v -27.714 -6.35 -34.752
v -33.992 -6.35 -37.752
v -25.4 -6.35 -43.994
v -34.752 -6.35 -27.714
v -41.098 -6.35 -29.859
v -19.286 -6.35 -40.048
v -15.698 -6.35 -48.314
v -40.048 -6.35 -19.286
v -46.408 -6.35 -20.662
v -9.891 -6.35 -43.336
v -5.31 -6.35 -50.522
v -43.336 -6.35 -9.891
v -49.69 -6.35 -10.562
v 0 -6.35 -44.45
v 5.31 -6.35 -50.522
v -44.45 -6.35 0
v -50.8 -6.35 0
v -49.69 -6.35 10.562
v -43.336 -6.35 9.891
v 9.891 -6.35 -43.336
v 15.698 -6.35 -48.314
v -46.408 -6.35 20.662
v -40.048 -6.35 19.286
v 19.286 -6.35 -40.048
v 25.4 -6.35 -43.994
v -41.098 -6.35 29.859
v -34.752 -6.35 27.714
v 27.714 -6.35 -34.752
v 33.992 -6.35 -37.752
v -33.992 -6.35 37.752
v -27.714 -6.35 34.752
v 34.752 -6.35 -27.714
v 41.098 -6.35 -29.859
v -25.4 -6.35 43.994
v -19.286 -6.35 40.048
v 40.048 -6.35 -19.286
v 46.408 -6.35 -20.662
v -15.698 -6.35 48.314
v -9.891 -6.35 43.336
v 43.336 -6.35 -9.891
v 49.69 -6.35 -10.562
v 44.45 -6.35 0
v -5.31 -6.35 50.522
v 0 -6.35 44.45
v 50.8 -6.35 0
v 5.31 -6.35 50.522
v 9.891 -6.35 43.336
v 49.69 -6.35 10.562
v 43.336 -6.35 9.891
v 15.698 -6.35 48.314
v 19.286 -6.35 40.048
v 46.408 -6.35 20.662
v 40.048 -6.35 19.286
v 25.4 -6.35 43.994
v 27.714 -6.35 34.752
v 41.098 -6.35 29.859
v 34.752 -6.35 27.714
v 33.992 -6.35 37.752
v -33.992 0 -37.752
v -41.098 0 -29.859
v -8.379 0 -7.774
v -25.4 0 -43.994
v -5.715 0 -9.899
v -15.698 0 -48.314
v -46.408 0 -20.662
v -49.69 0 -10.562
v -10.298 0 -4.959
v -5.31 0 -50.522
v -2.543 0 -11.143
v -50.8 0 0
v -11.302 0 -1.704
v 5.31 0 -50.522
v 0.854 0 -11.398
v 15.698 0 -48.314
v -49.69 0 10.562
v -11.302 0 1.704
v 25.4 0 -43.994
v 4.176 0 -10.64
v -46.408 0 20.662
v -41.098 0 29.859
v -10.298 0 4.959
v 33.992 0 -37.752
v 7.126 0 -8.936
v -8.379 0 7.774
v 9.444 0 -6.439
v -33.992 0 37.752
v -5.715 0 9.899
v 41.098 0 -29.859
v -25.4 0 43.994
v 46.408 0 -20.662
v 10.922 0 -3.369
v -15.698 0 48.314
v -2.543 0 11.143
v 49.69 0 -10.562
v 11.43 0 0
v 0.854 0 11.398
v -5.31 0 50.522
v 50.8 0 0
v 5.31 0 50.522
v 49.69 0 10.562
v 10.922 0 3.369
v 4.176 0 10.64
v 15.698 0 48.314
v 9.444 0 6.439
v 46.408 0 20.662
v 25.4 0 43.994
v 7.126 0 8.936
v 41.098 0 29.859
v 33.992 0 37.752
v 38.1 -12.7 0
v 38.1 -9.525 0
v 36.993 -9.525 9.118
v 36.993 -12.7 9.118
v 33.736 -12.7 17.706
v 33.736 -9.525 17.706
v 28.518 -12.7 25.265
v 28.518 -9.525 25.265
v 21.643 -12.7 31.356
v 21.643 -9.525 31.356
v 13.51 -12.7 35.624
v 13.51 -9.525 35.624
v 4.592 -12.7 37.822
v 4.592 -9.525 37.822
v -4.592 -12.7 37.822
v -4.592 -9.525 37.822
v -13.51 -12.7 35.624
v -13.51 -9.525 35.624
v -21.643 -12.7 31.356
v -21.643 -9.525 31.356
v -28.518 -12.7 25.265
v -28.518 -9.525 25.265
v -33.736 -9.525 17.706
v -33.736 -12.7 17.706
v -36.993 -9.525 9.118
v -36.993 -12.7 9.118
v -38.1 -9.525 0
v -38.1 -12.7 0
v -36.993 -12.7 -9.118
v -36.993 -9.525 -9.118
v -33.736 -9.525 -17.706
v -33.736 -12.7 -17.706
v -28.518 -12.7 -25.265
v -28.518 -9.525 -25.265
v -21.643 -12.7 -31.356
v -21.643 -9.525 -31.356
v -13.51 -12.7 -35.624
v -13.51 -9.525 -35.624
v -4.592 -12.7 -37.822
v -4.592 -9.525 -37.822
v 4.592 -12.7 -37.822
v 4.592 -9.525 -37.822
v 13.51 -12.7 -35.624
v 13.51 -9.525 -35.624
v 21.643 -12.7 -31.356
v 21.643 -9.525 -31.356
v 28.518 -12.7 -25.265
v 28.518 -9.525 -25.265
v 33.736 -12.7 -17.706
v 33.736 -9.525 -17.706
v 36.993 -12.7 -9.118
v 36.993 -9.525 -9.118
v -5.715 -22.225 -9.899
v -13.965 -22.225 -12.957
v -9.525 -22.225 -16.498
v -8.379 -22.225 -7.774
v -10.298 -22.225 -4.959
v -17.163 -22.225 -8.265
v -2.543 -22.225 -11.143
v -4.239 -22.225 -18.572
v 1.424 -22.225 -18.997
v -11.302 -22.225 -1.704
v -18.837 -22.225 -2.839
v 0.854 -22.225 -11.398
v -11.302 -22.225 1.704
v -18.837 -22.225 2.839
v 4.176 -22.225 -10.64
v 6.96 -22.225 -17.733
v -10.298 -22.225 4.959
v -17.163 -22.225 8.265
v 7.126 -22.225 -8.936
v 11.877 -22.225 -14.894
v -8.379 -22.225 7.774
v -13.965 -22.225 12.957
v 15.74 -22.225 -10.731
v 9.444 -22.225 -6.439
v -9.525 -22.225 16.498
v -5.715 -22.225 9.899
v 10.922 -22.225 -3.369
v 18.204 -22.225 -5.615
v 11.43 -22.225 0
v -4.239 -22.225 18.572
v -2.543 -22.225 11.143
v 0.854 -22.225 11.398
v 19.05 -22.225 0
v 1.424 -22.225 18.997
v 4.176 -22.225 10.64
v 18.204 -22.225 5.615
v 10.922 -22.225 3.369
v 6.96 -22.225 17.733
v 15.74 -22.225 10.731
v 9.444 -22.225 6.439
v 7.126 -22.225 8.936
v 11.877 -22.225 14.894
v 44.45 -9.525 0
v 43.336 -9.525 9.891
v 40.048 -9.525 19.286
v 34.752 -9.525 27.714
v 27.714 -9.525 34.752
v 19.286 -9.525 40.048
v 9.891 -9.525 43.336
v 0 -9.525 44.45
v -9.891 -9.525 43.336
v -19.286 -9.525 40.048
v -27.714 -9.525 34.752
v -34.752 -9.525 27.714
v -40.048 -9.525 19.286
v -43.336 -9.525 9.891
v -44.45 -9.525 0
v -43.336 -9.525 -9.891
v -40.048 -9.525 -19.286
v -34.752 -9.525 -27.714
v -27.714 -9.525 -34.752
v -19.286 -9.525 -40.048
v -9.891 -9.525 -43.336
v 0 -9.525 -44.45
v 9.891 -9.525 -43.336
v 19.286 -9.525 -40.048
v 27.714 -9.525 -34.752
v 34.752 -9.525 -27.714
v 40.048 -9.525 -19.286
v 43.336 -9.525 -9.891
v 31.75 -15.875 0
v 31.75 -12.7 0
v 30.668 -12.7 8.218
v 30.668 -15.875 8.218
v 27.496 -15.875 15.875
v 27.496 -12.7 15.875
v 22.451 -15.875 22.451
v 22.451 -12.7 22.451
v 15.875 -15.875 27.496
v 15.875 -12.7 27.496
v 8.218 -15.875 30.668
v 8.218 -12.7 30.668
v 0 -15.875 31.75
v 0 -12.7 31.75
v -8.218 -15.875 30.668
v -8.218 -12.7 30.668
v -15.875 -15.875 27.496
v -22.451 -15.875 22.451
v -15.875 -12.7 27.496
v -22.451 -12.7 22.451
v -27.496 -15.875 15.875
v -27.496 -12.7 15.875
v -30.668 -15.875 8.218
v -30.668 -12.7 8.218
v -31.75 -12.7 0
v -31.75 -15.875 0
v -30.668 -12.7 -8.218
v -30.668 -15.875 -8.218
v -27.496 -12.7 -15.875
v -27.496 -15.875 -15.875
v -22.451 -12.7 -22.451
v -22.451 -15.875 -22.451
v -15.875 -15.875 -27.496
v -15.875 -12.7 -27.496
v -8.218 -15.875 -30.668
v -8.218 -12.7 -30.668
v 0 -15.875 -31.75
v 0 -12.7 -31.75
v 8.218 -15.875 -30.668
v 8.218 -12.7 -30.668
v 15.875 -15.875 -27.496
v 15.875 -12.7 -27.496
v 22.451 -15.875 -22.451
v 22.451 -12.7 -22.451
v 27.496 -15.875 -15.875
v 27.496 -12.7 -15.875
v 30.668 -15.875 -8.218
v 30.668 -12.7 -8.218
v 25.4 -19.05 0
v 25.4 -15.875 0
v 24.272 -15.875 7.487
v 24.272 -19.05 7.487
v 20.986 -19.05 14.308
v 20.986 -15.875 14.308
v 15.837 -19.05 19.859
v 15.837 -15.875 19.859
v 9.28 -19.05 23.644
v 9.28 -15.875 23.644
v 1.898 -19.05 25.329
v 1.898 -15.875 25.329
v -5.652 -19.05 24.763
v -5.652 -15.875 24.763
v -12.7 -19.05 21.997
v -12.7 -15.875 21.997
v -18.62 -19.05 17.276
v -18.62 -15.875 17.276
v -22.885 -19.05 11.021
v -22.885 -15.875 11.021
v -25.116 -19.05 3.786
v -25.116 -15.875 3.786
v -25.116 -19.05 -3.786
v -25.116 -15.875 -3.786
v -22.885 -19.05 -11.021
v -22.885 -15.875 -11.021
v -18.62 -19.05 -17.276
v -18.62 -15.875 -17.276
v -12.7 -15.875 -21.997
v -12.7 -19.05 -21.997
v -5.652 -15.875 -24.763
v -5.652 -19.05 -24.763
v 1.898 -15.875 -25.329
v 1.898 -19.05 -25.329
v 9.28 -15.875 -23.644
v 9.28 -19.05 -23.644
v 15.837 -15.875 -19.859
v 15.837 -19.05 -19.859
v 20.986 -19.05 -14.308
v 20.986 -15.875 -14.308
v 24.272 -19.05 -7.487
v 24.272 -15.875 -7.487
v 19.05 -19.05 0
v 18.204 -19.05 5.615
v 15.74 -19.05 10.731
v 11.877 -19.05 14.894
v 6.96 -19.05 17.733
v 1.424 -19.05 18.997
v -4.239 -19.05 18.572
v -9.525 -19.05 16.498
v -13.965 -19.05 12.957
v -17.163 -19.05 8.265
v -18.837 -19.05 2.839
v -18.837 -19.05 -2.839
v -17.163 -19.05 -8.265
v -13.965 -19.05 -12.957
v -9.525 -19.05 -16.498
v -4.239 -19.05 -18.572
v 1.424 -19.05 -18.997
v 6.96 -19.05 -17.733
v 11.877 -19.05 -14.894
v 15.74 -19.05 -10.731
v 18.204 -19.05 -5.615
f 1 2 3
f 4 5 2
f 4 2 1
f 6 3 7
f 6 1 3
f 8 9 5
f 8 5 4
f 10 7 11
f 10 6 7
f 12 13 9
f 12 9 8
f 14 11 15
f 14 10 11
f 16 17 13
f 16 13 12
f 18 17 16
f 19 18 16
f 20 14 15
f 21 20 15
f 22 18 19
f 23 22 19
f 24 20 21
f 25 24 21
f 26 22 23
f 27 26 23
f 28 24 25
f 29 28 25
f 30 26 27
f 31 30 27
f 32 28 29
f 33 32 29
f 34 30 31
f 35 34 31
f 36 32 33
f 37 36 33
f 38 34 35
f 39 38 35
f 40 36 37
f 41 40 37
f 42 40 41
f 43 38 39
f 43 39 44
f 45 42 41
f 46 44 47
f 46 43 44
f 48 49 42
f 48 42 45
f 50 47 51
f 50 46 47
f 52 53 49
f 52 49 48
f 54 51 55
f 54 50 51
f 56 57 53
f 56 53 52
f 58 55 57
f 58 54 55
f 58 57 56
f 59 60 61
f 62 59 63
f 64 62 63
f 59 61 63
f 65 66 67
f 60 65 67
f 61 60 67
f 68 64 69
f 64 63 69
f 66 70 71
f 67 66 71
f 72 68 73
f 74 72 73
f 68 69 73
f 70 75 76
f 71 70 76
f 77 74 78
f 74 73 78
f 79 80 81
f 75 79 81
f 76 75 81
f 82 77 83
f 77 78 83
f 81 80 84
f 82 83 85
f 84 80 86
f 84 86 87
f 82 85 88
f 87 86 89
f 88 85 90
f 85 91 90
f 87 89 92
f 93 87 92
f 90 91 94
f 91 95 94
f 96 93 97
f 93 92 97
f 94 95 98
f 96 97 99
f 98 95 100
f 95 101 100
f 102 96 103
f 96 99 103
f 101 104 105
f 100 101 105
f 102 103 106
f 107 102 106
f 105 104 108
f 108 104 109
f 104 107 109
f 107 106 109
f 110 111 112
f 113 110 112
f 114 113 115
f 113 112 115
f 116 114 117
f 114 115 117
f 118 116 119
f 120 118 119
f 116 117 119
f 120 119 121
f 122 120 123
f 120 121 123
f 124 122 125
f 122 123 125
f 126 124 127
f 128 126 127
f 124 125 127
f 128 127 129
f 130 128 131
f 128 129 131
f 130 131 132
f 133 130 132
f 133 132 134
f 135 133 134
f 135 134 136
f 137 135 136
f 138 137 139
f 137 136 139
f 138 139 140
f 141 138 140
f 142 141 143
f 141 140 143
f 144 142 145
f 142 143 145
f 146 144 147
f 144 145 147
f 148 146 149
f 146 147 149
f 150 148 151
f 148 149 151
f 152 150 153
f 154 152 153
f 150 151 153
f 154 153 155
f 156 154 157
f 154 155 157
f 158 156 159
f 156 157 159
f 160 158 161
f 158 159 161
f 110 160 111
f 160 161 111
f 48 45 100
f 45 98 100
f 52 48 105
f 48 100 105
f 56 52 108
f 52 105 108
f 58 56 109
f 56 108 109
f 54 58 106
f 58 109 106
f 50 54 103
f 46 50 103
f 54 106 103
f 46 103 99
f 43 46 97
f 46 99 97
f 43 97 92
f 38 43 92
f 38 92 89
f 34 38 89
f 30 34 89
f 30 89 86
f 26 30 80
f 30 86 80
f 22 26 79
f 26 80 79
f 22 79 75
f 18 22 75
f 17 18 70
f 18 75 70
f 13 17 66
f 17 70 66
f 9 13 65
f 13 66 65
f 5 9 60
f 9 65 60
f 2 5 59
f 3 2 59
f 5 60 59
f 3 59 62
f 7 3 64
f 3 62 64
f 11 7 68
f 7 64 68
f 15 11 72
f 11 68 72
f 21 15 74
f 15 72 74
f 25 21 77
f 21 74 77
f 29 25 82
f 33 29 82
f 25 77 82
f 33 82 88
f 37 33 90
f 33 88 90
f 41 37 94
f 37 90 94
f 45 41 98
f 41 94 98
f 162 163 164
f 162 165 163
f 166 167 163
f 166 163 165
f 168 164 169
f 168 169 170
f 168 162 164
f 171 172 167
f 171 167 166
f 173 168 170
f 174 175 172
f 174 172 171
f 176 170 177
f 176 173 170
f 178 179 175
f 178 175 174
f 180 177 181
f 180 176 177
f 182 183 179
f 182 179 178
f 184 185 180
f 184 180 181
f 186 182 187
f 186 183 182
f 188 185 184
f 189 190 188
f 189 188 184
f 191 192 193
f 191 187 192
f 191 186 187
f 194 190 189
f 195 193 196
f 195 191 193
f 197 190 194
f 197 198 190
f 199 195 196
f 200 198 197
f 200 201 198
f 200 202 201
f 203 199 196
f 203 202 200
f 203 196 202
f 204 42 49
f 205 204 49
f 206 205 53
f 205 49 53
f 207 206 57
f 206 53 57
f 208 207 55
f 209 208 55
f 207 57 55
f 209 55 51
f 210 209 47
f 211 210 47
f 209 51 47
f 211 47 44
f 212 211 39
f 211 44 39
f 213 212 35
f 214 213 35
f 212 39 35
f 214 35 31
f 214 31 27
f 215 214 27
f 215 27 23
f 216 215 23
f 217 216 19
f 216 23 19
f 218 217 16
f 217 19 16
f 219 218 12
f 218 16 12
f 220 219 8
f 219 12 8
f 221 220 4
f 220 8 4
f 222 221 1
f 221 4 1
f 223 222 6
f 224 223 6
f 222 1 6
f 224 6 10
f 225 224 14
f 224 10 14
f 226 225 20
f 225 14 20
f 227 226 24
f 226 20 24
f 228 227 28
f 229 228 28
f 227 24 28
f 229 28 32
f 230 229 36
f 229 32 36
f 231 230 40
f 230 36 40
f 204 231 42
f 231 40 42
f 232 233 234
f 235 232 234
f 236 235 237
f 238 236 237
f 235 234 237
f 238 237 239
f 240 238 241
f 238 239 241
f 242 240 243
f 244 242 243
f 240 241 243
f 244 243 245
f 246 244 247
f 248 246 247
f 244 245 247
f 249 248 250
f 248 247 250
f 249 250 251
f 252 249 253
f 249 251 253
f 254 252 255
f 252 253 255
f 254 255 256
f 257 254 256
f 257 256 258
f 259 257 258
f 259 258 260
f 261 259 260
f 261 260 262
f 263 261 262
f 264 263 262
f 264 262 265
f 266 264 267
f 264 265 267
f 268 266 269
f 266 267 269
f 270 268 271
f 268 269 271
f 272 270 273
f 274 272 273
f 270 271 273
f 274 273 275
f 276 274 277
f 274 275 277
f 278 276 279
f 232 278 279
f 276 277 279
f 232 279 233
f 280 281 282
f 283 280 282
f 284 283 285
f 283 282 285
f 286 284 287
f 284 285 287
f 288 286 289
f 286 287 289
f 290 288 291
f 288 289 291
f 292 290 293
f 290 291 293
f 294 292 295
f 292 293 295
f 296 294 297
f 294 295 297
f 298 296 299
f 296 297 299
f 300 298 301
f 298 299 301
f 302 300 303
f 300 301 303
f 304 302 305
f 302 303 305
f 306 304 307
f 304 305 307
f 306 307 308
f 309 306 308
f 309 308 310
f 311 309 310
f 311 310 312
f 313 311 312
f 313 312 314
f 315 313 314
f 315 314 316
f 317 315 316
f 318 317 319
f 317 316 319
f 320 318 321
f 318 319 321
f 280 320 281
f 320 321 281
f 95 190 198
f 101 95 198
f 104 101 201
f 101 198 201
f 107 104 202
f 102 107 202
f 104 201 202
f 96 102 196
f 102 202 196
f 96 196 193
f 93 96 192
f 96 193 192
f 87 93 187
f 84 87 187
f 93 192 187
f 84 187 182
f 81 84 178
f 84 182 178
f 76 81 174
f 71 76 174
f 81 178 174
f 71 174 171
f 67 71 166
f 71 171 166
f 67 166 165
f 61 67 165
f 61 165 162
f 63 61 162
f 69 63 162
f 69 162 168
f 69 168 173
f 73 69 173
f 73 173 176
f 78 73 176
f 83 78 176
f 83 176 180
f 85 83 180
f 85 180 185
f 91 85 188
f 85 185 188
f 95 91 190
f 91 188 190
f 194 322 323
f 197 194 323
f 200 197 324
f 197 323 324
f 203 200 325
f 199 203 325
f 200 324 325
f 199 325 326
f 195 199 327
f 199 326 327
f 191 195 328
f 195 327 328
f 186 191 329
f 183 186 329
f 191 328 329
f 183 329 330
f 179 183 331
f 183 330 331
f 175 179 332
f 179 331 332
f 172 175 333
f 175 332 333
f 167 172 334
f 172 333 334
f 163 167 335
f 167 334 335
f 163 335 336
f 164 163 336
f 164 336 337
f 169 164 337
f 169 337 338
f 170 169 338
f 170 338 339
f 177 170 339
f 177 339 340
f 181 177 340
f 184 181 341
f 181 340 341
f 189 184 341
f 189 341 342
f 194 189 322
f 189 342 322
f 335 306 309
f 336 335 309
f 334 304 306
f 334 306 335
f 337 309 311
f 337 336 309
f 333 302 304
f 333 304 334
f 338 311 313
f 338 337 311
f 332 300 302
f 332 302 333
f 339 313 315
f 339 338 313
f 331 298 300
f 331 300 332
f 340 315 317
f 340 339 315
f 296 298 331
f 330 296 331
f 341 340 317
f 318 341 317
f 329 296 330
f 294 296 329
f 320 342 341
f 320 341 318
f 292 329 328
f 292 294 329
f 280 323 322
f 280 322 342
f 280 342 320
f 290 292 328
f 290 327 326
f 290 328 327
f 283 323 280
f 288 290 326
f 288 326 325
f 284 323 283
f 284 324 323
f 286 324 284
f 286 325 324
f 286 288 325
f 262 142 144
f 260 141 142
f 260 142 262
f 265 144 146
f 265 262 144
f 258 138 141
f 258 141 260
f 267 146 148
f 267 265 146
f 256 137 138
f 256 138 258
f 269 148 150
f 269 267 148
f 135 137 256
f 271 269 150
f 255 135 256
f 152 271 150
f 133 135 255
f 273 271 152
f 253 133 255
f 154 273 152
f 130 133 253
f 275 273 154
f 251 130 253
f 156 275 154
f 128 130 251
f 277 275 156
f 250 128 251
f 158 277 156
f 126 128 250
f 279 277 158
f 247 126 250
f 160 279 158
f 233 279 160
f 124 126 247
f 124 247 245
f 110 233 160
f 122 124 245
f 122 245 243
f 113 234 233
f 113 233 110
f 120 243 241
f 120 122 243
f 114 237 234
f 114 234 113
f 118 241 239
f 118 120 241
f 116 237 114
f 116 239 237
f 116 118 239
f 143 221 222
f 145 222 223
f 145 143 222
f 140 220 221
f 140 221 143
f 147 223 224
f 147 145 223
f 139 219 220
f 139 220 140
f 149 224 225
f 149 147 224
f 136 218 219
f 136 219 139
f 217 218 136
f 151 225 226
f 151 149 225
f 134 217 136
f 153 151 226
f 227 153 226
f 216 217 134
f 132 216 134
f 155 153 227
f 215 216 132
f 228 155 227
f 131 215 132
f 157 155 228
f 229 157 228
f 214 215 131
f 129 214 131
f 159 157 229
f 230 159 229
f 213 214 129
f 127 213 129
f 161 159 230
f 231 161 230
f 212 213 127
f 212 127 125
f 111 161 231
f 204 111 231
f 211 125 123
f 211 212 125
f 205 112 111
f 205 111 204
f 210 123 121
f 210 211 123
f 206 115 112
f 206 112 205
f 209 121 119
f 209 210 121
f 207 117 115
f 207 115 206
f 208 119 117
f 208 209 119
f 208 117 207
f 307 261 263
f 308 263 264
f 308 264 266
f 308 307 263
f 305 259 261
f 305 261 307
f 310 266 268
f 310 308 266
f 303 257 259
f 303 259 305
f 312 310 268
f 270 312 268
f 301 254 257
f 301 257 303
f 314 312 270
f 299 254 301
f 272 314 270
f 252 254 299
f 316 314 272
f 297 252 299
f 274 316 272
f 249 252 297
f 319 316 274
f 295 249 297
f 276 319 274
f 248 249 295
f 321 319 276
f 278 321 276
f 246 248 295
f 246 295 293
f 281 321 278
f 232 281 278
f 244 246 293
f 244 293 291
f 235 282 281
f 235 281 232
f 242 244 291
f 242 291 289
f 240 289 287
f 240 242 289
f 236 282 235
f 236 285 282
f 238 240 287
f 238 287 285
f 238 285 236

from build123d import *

# Parameters (mm, degrees)
F0_R      = 50.8
F1_DEPTH  = 3.175
F2_R      = 50.8
F3_DEPTH  = 3.175
F4_R      = 44.45
F5_DEPTH  = 3.175
F6_R      = 38.1
F7_DEPTH  = 3.175
F8_R      = 31.75
F9_DEPTH  = 3.175
F10_R     = 25.4
F11_DEPTH = 3.175
F12_R     = 19.05
F13_DEPTH = 3.175
F14_R     = 11.43
F15_DEPTH = 22.225


with BuildPart() as f1:
    # F0 (on Front) → F1 (new body)
    with BuildSketch(Plane.XZ):
        Circle(F0_R)
    extrude(amount=F1_DEPTH)

    # F2 (on face) → F3 (join)
    with BuildSketch(Plane.XZ.offset(3.175)):
        Circle(F2_R)
    extrude(amount=F3_DEPTH)

    # F4 (on face) → F5 (join)
    with BuildSketch(Plane.XZ.offset(6.35)):
        Circle(F4_R)
    extrude(amount=F5_DEPTH)

    # F6 (on face) → F7 (join)
    with BuildSketch(Plane.XZ.offset(9.525)):
        Circle(F6_R)
    extrude(amount=F7_DEPTH)

    # F8 (on face) → F9 (join)
    with BuildSketch(Plane.XZ.offset(12.7)):
        Circle(F8_R)
    extrude(amount=F9_DEPTH)

    # F10 (on face) → F11 (join)
    with BuildSketch(Plane.XZ.offset(15.875)):
        Circle(F10_R)
    extrude(amount=F11_DEPTH)

    # F12 (on face) → F13 (join)
    with BuildSketch(Plane.XZ.offset(19.05)):
        Circle(F12_R)
    extrude(amount=F13_DEPTH)

    # F14 (on face) → F15 (cut)
    with BuildSketch(Plane.XZ.offset(22.225)):
        Circle(F14_R)
    extrude(amount=-F15_DEPTH, mode=Mode.SUBTRACT)


solid = f1.part
